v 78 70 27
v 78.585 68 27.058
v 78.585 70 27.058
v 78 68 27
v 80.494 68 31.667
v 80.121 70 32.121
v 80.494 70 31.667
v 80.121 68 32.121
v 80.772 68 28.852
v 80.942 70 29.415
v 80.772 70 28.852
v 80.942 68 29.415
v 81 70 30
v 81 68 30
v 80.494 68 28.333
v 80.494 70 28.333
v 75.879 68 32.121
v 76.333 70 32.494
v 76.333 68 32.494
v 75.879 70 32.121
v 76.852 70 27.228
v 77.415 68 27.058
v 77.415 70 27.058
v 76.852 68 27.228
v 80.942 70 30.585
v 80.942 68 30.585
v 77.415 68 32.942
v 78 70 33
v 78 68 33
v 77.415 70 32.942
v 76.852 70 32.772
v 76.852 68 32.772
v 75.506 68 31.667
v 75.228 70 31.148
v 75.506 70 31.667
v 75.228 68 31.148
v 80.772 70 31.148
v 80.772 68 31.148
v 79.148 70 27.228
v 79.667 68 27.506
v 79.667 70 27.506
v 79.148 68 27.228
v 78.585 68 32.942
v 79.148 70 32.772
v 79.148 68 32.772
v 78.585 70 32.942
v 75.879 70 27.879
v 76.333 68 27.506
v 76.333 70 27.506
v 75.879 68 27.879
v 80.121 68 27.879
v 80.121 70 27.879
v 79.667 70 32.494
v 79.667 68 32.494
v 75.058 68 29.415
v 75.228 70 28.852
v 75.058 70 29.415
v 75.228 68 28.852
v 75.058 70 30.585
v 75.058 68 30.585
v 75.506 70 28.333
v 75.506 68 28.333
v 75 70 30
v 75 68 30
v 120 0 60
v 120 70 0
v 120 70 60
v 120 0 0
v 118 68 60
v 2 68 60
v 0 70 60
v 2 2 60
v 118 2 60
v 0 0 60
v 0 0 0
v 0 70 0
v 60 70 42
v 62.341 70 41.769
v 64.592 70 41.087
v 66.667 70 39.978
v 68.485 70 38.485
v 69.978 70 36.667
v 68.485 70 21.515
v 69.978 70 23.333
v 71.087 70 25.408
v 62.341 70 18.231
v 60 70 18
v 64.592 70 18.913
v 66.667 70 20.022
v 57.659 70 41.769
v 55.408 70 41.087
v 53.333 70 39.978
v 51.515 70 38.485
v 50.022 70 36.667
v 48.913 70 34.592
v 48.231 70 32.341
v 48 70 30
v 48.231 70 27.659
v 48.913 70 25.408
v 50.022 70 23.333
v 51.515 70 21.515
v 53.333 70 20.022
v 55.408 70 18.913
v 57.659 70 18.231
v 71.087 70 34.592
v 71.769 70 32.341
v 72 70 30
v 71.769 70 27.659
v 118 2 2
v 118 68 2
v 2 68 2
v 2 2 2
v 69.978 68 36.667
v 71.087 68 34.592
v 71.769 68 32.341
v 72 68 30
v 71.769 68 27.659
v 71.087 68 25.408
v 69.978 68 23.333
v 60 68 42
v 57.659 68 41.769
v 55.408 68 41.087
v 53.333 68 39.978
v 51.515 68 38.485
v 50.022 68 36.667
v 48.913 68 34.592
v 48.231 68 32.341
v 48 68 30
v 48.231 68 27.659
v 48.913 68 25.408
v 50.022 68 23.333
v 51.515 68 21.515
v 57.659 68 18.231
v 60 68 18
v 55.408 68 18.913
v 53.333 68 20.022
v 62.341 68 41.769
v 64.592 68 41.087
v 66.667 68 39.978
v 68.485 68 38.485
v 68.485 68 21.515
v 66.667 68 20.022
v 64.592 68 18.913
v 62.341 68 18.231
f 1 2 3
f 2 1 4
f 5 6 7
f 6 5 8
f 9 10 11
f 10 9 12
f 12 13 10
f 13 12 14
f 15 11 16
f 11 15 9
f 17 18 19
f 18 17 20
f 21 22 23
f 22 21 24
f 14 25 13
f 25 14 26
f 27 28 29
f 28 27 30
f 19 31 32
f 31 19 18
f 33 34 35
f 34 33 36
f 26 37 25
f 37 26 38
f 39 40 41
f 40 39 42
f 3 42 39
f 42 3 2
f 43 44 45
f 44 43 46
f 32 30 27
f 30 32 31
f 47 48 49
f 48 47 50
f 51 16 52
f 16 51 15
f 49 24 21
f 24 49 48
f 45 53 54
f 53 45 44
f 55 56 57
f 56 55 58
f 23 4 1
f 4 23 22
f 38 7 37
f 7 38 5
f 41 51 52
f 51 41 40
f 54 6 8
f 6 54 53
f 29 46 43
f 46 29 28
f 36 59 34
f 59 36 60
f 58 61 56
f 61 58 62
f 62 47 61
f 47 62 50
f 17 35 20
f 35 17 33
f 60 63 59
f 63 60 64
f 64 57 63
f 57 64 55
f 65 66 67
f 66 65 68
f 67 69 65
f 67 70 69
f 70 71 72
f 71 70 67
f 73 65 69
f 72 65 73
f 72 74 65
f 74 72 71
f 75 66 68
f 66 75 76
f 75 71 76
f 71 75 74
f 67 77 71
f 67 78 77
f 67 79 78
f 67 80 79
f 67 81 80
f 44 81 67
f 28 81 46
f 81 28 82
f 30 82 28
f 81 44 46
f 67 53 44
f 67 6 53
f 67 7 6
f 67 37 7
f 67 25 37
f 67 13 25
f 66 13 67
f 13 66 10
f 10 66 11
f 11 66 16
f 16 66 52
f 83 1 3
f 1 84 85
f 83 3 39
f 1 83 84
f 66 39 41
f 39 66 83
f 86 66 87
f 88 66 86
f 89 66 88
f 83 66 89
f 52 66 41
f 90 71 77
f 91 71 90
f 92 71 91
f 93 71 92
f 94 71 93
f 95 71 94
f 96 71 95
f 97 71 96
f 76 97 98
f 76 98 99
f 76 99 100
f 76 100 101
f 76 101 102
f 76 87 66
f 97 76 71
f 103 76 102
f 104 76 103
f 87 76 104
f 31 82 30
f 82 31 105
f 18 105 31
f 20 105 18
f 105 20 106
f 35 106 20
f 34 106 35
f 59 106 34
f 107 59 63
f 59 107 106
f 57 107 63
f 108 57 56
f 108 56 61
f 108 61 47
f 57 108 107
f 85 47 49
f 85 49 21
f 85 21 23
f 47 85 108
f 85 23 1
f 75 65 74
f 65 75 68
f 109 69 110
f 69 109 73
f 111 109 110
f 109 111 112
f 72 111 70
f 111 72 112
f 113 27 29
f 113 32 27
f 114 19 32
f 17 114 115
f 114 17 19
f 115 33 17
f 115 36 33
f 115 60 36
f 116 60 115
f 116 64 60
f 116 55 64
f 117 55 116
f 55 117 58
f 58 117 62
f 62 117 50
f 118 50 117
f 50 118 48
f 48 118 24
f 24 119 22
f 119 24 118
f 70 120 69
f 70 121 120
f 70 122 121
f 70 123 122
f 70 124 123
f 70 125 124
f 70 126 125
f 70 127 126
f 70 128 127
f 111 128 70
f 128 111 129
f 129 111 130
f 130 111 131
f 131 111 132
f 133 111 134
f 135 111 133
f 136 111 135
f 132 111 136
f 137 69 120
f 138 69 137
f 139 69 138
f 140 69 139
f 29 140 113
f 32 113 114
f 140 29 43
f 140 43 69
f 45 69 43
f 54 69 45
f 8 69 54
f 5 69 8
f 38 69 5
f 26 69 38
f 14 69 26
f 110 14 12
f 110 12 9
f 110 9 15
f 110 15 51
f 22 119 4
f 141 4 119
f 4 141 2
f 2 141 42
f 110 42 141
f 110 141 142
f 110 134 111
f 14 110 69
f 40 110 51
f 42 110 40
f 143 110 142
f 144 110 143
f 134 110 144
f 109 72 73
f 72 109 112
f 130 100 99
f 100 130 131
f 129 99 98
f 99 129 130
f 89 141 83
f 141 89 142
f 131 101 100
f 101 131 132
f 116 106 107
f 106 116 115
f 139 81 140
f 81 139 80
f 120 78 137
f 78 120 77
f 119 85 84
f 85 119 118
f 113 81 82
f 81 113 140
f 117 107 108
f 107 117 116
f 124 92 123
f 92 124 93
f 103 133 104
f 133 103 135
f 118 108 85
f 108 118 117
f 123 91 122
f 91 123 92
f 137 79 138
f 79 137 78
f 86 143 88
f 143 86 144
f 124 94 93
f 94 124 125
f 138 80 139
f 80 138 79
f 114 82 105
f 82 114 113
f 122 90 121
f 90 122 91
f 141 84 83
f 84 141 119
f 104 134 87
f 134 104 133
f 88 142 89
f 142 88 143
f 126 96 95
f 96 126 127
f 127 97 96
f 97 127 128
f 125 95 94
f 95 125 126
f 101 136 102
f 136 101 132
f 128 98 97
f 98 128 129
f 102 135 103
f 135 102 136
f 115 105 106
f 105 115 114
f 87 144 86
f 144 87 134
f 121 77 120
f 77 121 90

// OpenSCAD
$fn = 32;

// ----------------------------------------------------------------------
// Vent box: roundvent enclosure
// ----------------------------------------------------------------------

// --- parameters (mm) ---
box_l = 120;              // box length, X
box_w = 70;               // box width, Y
box_h = 60;               // box height, Z
wall_t = 2;               // shell wall thickness
vent_d = 24;              // central vent diameter
ring_d = 6;               // ring hole diameter
n_ring = 6;               // holes in the ring
ring_r = 18;              // ring radius

ring_step = 360 / n_ring;  // ring hole angular step

difference() {
  cube([box_l, box_w, box_h]);
  translate([wall_t, wall_t, wall_t])
    cube([box_l - 2 * wall_t, box_w - 2 * wall_t, box_h]);
  translate([box_l / 2, box_w - wall_t - 1, box_h / 2])
    rotate([-90, 0, 0]) cylinder(h = wall_t + 2, d = vent_d);
  for (i = [0 : n_ring - 1])
    translate([box_l / 2, box_w - wall_t - 1, box_h / 2])
      rotate([0, 0, i * ring_step])
        translate([ring_r, 0, 0]) rotate([-90, 0, 0])
          cylinder(h = wall_t + 2, d = ring_d);
}
